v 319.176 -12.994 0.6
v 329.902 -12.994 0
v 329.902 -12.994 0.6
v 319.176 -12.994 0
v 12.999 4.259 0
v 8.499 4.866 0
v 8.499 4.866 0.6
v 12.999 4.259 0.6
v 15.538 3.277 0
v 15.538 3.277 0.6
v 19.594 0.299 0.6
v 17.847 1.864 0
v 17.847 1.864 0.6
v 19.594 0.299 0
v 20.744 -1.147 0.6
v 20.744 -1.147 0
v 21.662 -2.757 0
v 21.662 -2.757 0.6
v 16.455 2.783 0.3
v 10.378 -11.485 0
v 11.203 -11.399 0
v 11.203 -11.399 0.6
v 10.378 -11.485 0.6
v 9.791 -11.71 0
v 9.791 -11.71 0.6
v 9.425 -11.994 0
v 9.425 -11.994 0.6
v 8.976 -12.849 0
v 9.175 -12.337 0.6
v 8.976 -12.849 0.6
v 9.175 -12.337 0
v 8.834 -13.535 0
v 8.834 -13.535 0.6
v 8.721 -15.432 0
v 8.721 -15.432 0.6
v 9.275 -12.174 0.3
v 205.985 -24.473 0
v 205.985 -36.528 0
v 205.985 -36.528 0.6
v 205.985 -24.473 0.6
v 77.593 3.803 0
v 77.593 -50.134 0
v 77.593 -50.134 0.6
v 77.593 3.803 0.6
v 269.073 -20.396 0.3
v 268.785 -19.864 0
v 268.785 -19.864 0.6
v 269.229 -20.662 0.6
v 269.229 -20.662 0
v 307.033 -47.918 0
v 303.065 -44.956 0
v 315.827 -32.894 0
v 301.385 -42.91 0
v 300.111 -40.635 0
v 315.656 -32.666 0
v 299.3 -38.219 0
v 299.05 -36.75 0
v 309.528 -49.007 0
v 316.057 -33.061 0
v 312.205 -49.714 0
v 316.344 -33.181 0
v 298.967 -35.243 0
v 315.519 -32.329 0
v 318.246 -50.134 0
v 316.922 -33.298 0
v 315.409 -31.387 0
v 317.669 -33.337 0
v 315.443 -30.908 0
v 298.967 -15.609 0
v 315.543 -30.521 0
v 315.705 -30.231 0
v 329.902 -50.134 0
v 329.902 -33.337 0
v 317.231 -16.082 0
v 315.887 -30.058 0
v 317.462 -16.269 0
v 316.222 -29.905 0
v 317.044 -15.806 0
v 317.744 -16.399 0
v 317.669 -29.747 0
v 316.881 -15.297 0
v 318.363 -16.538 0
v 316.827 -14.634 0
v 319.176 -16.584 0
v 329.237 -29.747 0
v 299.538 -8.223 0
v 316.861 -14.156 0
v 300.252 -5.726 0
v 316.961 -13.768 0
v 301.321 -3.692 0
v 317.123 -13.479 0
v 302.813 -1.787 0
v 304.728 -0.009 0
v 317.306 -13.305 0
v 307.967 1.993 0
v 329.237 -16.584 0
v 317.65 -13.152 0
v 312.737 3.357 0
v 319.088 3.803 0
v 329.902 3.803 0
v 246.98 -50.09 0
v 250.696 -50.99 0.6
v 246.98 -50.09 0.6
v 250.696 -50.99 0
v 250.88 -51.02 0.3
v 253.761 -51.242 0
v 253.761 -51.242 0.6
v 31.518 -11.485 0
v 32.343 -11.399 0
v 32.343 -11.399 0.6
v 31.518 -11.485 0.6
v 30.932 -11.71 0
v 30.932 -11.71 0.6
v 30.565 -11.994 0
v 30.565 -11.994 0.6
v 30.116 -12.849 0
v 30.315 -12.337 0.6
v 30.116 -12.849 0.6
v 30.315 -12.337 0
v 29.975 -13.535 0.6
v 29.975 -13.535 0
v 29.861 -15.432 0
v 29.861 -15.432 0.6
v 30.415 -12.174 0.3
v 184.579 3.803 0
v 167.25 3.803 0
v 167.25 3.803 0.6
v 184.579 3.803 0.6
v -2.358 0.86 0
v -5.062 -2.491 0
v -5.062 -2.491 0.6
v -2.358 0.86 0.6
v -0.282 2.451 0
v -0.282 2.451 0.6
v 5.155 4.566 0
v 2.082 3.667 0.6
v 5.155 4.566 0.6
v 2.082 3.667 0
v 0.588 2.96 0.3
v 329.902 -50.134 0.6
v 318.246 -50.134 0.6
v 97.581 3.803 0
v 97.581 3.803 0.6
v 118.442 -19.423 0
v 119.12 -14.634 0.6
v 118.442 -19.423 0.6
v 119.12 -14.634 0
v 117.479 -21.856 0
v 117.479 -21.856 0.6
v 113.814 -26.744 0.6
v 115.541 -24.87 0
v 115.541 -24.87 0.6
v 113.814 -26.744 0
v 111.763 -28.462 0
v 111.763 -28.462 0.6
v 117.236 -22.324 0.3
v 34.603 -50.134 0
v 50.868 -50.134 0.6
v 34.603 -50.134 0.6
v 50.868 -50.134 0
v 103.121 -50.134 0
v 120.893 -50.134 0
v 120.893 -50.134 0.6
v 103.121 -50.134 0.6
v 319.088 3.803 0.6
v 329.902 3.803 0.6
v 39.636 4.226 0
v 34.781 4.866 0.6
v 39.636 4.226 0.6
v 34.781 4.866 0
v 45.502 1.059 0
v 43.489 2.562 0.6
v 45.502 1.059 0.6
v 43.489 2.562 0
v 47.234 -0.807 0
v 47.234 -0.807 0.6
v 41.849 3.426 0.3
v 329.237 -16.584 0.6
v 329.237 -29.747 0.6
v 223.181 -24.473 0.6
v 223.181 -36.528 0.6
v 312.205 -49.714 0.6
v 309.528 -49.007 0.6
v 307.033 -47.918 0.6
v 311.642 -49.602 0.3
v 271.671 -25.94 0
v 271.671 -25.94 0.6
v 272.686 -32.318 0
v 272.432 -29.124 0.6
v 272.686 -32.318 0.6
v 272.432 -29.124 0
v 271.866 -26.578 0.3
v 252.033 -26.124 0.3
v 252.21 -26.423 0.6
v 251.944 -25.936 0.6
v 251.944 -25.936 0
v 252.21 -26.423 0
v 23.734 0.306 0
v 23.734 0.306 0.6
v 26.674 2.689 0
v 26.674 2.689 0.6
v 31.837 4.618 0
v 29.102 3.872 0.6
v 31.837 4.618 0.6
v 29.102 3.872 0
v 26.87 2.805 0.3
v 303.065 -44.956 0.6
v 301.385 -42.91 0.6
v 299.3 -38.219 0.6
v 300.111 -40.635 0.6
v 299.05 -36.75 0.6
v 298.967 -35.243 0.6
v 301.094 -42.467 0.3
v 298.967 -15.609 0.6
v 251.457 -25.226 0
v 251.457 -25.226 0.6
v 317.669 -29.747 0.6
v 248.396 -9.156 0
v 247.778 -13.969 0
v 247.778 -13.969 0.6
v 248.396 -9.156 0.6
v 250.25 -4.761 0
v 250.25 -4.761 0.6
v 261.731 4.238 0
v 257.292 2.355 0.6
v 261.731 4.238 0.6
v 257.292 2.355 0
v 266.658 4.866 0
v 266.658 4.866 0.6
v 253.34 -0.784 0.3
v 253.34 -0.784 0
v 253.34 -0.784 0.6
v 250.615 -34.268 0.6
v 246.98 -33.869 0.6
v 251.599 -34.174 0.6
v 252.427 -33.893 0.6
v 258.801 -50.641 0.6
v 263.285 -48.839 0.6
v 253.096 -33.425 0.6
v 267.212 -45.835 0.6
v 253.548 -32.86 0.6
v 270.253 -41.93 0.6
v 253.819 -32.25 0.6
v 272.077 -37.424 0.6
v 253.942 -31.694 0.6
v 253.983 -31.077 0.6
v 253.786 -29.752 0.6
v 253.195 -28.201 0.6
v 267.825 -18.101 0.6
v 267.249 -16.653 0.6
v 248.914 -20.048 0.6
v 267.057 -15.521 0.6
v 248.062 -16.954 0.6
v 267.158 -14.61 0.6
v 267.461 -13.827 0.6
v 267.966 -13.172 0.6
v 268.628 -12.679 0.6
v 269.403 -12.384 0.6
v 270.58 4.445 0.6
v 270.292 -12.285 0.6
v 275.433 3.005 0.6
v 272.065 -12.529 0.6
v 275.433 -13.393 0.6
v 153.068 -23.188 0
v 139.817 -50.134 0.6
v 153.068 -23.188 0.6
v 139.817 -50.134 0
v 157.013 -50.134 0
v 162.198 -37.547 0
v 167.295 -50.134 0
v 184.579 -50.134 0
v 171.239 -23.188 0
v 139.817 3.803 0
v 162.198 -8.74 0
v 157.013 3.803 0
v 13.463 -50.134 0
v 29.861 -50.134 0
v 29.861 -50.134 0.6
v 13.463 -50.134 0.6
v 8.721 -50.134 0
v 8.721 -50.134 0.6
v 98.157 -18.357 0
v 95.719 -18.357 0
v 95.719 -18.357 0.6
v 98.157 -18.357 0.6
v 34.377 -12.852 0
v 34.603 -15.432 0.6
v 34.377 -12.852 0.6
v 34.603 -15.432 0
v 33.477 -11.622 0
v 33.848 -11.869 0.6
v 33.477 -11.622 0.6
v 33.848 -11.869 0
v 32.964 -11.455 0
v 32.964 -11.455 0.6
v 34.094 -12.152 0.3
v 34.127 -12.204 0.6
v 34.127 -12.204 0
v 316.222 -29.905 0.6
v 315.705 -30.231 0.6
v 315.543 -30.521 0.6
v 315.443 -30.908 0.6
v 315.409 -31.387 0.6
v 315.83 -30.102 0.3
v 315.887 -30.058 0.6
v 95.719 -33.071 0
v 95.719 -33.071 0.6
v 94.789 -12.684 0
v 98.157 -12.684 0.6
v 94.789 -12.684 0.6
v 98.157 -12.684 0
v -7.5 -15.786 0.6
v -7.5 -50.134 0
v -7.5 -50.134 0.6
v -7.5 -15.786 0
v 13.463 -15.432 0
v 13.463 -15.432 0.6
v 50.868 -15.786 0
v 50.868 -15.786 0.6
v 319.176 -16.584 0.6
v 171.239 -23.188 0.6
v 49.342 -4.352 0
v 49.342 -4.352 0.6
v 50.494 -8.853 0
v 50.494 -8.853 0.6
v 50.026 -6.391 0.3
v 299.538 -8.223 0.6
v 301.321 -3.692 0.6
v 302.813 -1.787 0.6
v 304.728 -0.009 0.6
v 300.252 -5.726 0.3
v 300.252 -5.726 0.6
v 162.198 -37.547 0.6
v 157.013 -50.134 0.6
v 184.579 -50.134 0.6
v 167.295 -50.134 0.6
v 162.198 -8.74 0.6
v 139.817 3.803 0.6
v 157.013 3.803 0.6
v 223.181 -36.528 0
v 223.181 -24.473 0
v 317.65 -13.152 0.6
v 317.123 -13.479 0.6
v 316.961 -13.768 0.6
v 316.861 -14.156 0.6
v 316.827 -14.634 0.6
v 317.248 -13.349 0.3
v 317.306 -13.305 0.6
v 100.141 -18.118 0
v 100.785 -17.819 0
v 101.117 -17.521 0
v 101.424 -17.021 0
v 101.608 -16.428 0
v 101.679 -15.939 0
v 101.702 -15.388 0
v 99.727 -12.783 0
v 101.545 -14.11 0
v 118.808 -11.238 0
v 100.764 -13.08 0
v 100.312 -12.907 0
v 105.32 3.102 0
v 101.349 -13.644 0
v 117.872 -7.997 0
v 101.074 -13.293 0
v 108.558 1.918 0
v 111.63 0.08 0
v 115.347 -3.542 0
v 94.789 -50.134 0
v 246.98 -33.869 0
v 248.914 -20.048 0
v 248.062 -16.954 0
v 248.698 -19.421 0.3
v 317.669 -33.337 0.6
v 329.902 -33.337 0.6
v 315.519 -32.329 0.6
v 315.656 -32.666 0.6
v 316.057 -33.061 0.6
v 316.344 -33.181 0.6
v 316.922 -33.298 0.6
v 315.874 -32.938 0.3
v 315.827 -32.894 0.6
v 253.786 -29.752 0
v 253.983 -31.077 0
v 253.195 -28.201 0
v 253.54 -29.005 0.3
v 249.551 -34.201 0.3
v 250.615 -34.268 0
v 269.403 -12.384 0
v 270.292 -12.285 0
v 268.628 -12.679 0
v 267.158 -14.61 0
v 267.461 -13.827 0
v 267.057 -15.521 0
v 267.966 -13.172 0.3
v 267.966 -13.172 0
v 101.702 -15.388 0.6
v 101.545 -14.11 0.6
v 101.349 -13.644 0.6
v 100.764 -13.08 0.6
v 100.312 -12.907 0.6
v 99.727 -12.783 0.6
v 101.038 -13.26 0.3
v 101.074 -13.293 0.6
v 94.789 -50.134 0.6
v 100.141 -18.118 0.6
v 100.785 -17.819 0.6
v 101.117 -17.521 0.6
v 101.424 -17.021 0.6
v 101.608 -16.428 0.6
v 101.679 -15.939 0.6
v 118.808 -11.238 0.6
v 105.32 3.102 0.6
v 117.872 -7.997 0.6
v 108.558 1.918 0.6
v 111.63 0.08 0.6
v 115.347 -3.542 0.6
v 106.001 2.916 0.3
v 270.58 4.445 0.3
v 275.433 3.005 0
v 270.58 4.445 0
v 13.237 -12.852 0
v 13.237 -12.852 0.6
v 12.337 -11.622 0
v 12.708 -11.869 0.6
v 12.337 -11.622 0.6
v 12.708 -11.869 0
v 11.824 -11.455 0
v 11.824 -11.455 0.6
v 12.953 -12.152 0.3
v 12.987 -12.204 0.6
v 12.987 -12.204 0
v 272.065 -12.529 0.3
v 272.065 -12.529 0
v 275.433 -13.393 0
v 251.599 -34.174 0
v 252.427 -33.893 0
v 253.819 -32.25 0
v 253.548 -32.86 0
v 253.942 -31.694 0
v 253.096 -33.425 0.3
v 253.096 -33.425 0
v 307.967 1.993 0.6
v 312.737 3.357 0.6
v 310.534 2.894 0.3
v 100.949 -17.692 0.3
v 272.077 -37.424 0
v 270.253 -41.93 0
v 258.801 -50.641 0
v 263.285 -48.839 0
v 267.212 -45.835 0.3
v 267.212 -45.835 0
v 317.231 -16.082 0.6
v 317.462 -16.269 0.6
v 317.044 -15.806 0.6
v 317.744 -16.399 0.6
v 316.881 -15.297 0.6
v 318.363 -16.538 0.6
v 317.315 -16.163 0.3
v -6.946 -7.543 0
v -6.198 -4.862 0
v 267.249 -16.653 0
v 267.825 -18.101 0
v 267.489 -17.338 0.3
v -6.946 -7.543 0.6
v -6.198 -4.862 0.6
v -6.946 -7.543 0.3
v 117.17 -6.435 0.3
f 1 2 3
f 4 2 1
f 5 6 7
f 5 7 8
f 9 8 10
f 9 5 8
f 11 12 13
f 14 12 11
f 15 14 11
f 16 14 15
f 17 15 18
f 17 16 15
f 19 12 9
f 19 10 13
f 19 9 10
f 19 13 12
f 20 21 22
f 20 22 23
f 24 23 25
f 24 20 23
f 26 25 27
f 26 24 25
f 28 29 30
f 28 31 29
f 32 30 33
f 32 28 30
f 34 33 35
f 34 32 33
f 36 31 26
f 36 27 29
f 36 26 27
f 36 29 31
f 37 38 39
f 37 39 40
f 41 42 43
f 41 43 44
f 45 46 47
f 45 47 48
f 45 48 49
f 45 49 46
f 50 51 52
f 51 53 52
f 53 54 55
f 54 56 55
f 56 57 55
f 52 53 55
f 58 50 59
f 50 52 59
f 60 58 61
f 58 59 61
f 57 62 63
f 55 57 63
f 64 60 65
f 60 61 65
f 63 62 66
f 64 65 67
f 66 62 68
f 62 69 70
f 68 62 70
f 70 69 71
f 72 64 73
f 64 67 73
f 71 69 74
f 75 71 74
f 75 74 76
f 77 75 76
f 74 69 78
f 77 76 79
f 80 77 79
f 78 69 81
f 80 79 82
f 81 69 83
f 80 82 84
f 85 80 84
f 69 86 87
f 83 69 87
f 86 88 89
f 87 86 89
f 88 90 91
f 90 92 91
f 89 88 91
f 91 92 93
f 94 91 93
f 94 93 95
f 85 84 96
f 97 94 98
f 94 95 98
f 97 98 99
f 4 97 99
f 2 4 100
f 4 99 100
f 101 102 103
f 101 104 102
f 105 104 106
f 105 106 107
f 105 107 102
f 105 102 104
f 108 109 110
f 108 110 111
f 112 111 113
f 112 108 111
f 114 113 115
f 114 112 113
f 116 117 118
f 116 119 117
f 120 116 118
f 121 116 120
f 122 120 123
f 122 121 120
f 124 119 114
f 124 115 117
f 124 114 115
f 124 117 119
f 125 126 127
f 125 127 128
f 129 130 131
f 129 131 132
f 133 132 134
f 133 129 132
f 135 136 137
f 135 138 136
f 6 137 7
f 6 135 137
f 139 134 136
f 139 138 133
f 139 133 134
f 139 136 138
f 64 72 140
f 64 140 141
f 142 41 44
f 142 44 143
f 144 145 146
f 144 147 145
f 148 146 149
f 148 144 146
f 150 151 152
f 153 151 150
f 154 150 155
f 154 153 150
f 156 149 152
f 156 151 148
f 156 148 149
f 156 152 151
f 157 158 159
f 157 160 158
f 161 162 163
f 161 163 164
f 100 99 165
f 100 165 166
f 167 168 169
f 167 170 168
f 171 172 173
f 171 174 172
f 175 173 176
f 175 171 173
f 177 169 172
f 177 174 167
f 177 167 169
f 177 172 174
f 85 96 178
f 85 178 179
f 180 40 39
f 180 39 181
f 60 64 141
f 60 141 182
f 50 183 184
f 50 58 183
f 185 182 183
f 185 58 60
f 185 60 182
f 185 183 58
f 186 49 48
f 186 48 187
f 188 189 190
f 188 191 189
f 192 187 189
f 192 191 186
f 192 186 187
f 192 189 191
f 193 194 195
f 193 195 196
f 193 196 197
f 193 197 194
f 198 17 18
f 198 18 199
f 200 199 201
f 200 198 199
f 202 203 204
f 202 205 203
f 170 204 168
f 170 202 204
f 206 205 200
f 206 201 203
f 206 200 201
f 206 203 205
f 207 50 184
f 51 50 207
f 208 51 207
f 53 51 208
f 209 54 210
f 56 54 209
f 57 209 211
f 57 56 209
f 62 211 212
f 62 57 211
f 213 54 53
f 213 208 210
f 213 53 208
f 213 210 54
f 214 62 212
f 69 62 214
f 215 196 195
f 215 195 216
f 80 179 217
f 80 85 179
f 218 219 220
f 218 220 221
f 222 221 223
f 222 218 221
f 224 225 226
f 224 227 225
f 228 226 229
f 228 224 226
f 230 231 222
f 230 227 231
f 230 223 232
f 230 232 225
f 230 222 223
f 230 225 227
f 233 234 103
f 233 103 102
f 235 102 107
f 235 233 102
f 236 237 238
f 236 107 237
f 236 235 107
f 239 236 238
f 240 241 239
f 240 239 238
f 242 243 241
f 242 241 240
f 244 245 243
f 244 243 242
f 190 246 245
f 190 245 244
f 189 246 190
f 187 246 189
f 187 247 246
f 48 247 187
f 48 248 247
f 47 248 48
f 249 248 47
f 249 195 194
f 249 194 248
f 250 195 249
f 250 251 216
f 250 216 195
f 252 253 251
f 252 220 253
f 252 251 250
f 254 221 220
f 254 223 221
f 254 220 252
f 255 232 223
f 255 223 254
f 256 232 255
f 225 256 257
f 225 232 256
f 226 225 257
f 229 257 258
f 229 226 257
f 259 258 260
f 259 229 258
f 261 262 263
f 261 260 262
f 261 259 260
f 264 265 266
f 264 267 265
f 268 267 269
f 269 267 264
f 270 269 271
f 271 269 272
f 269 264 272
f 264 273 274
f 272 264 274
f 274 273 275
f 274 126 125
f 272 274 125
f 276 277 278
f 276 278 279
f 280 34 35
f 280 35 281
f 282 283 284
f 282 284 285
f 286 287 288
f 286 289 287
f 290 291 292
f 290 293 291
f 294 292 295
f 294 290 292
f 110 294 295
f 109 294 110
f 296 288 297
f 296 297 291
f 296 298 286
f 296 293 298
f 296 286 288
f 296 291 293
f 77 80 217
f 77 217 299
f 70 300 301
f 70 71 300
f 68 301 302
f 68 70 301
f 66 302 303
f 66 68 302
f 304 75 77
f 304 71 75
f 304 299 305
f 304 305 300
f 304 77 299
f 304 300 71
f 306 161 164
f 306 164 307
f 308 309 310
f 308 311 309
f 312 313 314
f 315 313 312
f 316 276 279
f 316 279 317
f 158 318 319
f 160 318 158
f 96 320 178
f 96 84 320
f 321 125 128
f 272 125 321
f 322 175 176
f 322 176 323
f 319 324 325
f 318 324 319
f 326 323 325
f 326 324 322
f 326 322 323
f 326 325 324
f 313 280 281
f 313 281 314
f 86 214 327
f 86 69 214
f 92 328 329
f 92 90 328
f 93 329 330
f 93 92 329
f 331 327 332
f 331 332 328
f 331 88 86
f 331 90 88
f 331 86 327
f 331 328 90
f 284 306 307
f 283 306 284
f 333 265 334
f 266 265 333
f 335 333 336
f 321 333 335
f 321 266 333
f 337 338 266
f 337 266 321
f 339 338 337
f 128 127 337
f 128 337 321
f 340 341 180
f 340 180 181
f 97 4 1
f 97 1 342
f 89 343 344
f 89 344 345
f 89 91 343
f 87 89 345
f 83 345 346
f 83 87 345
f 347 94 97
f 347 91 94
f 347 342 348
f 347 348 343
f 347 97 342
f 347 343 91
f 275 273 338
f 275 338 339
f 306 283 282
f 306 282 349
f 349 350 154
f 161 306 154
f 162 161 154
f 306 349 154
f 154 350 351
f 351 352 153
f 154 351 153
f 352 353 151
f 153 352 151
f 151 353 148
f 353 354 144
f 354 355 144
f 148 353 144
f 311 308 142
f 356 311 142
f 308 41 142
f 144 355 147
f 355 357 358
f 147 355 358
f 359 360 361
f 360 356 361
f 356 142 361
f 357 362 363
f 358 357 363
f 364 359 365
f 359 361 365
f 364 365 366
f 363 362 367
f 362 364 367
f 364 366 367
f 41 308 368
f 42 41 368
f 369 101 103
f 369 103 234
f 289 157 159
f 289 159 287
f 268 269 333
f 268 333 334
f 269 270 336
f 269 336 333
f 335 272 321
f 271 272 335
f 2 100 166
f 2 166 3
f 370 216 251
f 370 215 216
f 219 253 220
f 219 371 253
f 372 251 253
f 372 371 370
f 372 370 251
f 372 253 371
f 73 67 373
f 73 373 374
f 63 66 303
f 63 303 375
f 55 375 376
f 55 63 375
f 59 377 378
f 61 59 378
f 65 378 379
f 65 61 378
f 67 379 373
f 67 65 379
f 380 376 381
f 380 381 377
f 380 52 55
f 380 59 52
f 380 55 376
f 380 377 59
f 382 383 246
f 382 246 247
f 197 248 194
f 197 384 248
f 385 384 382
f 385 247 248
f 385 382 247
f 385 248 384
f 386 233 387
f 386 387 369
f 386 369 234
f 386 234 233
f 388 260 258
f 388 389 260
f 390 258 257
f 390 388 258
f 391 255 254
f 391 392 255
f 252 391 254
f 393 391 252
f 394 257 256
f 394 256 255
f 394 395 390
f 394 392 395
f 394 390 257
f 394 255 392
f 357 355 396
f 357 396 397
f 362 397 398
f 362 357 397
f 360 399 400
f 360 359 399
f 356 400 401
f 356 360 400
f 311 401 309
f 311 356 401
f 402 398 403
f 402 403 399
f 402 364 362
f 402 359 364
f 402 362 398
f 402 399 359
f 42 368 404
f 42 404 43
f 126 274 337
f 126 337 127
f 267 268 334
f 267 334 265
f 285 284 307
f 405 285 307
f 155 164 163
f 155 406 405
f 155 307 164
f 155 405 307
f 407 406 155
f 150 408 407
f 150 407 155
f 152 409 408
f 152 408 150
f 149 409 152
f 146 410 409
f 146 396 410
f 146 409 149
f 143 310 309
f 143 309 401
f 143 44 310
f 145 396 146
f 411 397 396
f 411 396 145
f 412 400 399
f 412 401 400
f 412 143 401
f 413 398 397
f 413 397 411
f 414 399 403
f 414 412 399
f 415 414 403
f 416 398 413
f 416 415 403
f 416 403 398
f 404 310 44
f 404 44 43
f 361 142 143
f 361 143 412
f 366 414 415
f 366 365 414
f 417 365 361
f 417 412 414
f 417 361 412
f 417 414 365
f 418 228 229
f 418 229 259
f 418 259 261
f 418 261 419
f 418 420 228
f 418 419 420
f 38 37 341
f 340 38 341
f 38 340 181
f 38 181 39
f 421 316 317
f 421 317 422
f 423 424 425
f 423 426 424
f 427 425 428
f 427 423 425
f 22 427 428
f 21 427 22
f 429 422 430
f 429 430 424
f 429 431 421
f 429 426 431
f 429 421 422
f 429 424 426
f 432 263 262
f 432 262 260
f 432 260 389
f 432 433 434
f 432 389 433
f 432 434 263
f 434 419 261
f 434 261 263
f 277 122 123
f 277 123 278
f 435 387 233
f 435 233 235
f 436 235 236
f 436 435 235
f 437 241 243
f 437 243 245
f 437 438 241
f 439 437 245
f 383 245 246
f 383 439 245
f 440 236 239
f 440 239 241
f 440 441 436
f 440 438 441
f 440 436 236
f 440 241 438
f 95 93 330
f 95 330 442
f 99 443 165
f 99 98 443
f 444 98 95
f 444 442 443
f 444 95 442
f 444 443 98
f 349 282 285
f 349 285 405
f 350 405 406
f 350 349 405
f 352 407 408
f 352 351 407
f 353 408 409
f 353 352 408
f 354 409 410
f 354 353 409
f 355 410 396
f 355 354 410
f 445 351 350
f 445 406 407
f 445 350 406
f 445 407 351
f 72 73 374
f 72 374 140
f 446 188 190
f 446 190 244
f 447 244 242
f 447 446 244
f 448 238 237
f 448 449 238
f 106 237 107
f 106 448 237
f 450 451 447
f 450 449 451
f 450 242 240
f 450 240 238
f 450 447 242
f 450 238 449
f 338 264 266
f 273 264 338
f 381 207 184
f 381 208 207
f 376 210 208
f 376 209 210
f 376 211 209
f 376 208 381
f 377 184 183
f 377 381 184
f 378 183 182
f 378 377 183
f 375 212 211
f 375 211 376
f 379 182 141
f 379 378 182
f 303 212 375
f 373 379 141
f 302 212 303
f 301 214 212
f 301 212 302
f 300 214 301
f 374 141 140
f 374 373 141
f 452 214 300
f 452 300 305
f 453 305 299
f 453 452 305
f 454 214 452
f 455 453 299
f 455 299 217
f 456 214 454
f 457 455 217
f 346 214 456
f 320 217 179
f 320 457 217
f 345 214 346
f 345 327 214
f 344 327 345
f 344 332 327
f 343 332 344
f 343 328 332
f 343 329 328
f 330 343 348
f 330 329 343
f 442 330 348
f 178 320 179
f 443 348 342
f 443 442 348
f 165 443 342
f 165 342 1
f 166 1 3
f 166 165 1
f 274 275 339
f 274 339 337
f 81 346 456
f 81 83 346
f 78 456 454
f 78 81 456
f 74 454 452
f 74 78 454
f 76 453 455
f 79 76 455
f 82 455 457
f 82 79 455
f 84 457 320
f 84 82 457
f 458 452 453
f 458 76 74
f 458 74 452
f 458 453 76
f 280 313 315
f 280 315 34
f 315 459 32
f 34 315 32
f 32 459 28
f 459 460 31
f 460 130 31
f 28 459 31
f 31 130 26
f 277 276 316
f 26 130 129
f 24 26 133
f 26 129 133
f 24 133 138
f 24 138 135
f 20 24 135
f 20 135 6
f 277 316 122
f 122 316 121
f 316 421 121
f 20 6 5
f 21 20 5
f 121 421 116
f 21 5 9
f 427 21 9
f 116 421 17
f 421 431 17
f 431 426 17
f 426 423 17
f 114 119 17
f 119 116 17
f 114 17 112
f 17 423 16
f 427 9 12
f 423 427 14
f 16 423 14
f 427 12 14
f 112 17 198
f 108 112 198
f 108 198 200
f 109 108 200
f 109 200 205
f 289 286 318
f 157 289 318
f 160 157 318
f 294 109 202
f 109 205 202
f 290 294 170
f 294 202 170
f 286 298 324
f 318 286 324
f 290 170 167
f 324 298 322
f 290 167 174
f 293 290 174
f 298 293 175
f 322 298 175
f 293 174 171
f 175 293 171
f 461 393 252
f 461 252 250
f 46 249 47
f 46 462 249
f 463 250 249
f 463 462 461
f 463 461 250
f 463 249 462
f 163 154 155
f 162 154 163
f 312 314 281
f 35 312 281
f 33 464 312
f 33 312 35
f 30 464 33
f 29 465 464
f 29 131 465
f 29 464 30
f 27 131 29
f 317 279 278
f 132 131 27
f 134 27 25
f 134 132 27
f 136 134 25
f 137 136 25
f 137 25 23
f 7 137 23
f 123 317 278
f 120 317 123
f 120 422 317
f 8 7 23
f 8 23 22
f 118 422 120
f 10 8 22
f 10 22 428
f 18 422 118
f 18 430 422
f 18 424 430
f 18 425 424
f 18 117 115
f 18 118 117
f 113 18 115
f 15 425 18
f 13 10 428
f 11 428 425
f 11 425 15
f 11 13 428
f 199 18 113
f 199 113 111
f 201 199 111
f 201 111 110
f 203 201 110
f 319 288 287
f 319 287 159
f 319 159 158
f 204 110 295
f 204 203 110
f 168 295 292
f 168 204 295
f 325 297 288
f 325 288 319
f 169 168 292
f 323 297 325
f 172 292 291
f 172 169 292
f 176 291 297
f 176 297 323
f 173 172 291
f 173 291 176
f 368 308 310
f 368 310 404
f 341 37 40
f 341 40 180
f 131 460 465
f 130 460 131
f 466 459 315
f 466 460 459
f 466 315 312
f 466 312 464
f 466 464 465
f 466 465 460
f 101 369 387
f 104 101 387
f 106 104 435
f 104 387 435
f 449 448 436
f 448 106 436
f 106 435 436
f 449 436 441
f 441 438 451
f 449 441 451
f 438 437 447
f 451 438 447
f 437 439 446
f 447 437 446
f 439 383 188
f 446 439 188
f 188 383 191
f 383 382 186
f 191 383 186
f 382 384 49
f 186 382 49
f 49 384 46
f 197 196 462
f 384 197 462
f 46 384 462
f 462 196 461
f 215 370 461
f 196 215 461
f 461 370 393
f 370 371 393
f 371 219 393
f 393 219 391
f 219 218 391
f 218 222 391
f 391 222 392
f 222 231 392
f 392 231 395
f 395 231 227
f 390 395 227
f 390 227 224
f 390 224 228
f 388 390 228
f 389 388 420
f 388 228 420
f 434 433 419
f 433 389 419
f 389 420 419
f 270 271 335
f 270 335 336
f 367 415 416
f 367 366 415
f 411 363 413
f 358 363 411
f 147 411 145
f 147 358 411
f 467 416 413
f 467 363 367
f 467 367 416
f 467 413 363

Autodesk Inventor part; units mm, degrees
ref_plane "YZ Plane" through (0, 0, 0) normal (1, 0, 0) x (0, 1, 0)
ref_plane "XZ Plane" through (0, 0, 0) normal (0, 1, 0) x (-1, 0, 0)
ref_plane "XY Plane" through (0, 0, 0) normal (0, 0, 1) x (1, 0, 0)
sketch "Boceto1" plane through (0, 0, 0) normal (0, 0, 1) x (1, 0, 0)
  line L0 (-10.159, 4.8662) -> (417.1829, 4.8662) construction
  line L1 (417.1829, 4.8662) -> (417.1829, -72.825) construction
  line L2 (417.1829, -72.825) -> (-10.159, -72.825) construction
  line L3 (-10.159, -72.825) -> (-10.159, 4.8662) construction
  line L4 (34.6033, -50.1338) -> (34.6033, -15.4319)
  spline S0 degree 2 poles (34.6033, -15.4319) (34.6033, -12.9057) (33.584, -11.3989) (32.343, -11.3989) knots 0 0 0 1 2 2 2
  spline S1 degree 2 poles (32.343, -11.3989) (30.9691, -11.3989) (29.8612, -12.95) (29.8612, -15.4319) knots 0 0 0 1 2 2 2
  line L5 (29.8612, -15.4319) -> (29.8612, -50.1338)
  line L6 (29.8612, -50.1338) -> (13.4631, -50.1338)
  line L7 (13.4631, -50.1338) -> (13.4631, -15.4319)
  spline S2 degree 2 poles (13.4631, -15.4319) (13.4631, -12.9057) (12.4438, -11.3989) (11.2028, -11.3989) knots 0 0 0 1 2 2 2
  spline S3 degree 2 poles (11.2028, -11.3989) (9.8289, -11.3989) (8.721, -12.95) (8.721, -15.4319) knots 0 0 0 1 2 2 2
  line L8 (8.721, -15.4319) -> (8.721, -50.1338)
  line L9 (8.721, -50.1338) -> (-7.4998, -50.1338)
  line L10 (-7.4998, -50.1338) -> (-7.4998, -15.7865)
  spline S4 degree 2 poles (-7.4998, -15.7865) (-7.4998, -10.3795) (-6.3919, -4.7067) (-5.0623, -2.4907) knots 0 0 0 1 2 2 2
  spline S5 degree 2 poles (-5.0623, -2.4907) (-2.935, 1.0548) (4.1118, 4.8662) (8.4994, 4.8662) knots 0 0 0 1 2 2 2
  spline S6 degree 2 poles (8.4994, 4.8662) (12.887, 4.8662) (20.0223, 0.7002) (21.6621, -2.7567) knots 0 0 0 1 2 2 2
  spline S7 degree 2 poles (21.6621, -2.7567) (23.3463, 0.7446) (30.393, 4.8662) (34.7806, 4.8662) knots 0 0 0 1 2 2 2
  spline S8 degree 2 poles (34.7806, 4.8662) (38.6363, 4.8662) (45.0626, 1.9855) (47.2343, -0.8066) knots 0 0 0 1 2 2 2
  spline S9 degree 2 poles (47.2343, -0.8066) (49.1843, -3.1998) (50.8684, -9.5818) (50.8684, -15.7865) knots 0 0 0 1 2 2 2
  line L11 (50.8684, -15.7865) -> (50.8684, -50.1338)
  line L12 (50.8684, -50.1338) -> (34.6033, -50.1338)
  line L13 (95.7193, -18.357) -> (98.1569, -18.357)
  spline S10 degree 2 poles (98.1569, -18.357) (100.1956, -18.357) (101.7024, -17.0274) (101.7024, -15.3876) knots 0 0 0 1 2 2 2
  spline S11 degree 2 poles (101.7024, -15.3876) (101.7024, -13.8364) (100.3729, -12.6841) (98.1569, -12.6841) knots 0 0 0 1 2 2 2
  line L14 (98.1569, -12.6841) -> (94.7886, -12.6841)
  line L15 (94.7886, -12.6841) -> (94.7886, -50.1338)
  line L16 (94.7886, -50.1338) -> (77.5928, -50.1338)
  line L17 (77.5928, -50.1338) -> (77.5928, 3.8026)
  line L18 (77.5928, 3.8026) -> (97.5807, 3.8026)
  spline S12 degree 2 poles (97.5807, 3.8026) (103.0763, 3.8026) (108.9264, 2.0298) (111.6299, 0.0798) knots 0 0 0 1 2 2 2
  spline S13 degree 2 poles (111.6299, 0.0798) (115.2197, -2.5794) (119.1198, -10.2909) (119.1198, -14.6342) knots 0 0 0 1 2 2 2
  spline S14 degree 2 poles (119.1198, -14.6342) (119.1198, -18.8445) (115.3527, -25.8026) (111.7629, -28.4617) knots 0 0 0 1 2 2 2
  line L19 (111.7629, -28.4617) -> (120.8926, -50.1338)
  line L20 (120.8926, -50.1338) -> (103.1206, -50.1338)
  line L21 (103.1206, -50.1338) -> (95.7193, -33.0709)
  line L22 (95.7193, -33.0709) -> (95.7193, -18.357)
  line L23 (139.8168, 3.8026) -> (157.0127, 3.8026)
  line L24 (157.0127, 3.8026) -> (162.198, -8.7397)
  line L25 (162.198, -8.7397) -> (167.2504, 3.8026)
  line L26 (167.2504, 3.8026) -> (184.5791, 3.8026)
  line L27 (184.5791, 3.8026) -> (171.2391, -23.1878)
  line L28 (171.2391, -23.1878) -> (184.5791, -50.1338)
  line L29 (184.5791, -50.1338) -> (167.2947, -50.1338)
  line L30 (167.2947, -50.1338) -> (162.198, -37.5471)
  line L31 (162.198, -37.5471) -> (157.0127, -50.1338)
  line L32 (157.0127, -50.1338) -> (139.8168, -50.1338)
  line L33 (139.8168, -50.1338) -> (153.0683, -23.1878)
  line L34 (153.0683, -23.1878) -> (139.8168, 3.8026)
  line L35 (205.9853, -36.5278) -> (205.9853, -24.473)
  line L36 (205.9853, -24.473) -> (223.1811, -24.473)
  line L37 (223.1811, -24.473) -> (223.1811, -36.5278)
  line L38 (223.1811, -36.5278) -> (205.9853, -36.5278)
  line L39 (246.9804, -50.0895) -> (246.9804, -33.8687)
  spline S15 degree 2 poles (246.9804, -33.8687) (248.9748, -34.1346) (250.1271, -34.2675) (250.6146, -34.2675) knots 0 0 0 1 2 2 2
  spline S16 degree 2 poles (250.6146, -34.2675) (252.2101, -34.2675) (253.9828, -32.5834) (253.9828, -31.0766) knots 0 0 0 1 2 2 2
  spline S17 degree 2 poles (253.9828, -31.0766) (253.9828, -29.2595) (252.2101, -26.4231) knots 0 0 0 1 1 1
  spline S18 degree 2 poles (252.2101, -26.4231) (251.9885, -26.0685) (251.9442, -25.9355) knots 0 0 0 1 1 1
  line L40 (251.9442, -25.9355) -> (251.4567, -25.2264)
  spline S19 degree 2 poles (251.4567, -25.2264) (247.7782, -19.2434) (247.7782, -13.9694) knots 0 0 0 1 1 1
  spline S20 degree 2 poles (247.7782, -13.9694) (247.7782, -6.4351) (258.9023, 4.8662) (266.6581, 4.8662) knots 0 0 0 1 2 2 2
  spline S21 degree 2 poles (266.6581, 4.8662) (268.5195, 4.8662) (272.6412, 4.0242) (275.4333, 3.0048) knots 0 0 0 1 2 2 2
  line L41 (275.4333, 3.0048) -> (275.4333, -13.3932)
  spline S22 degree 2 poles (275.4333, -13.3932) (273.0401, -12.7728) (271.09, -12.2853) (270.2923, -12.2853) knots 0 0 0 1 2 2 2
  spline S23 degree 2 poles (270.2923, -12.2853) (268.8741, -12.2853) (267.057, -14.058) (267.057, -15.5206) knots 0 0 0 1 2 2 2
  spline S24 degree 2 poles (267.057, -15.5206) (267.057, -16.9831) (268.7854, -19.8638) knots 0 0 0 1 1 1
  spline S25 degree 2 poles (268.7854, -19.8638) (269.14, -20.5286) (269.2286, -20.6616) knots 0 0 0 1 1 1
  spline S26 degree 2 poles (269.2286, -20.6616) (271.0457, -23.7196) (272.6855, -29.4368) (272.6855, -32.3175) knots 0 0 0 1 2 2 2
  spline S27 degree 2 poles (272.6855, -32.3175) (272.6855, -40.4279) (261.7387, -51.2417) (253.7612, -51.2417) knots 0 0 0 1 2 2 2
  spline S28 degree 2 poles (253.7612, -51.2417) (252.2987, -51.2417) (249.4623, -50.7986) (246.9804, -50.0895) knots 0 0 0 1 2 2 2
  line L42 (329.9015, -50.1338) -> (318.2455, -50.1338)
  spline S29 degree 2 poles (318.2455, -50.1338) (314.0795, -50.1338) (309.2044, -49.0701) (307.0328, -47.9178) knots 0 0 0 1 2 2 2
  spline S30 degree 2 poles (307.0328, -47.9178) (303.2214, -45.8348) (298.9667, -39.0983) (298.9667, -35.2426) knots 0 0 0 1 2 2 2
  line L43 (298.9667, -35.2426) -> (298.9667, -15.6092)
  spline S31 degree 2 poles (298.9667, -15.6092) (298.9667, -8.8727) (301.5372, -2.5794) (304.7282, -0.0089) knots 0 0 0 1 2 2 2
  spline S32 degree 2 poles (304.7282, -0.0089) (307.1214, 1.9855) (313.9466, 3.8026) (319.0876, 3.8026) knots 0 0 0 1 2 2 2
  line L44 (319.0876, 3.8026) -> (329.9015, 3.8026)
  line L45 (329.9015, 3.8026) -> (329.9015, -12.9944)
  line L46 (329.9015, -12.9944) -> (319.1762, -12.9944)
  spline S33 degree 2 poles (319.1762, -12.9944) (317.6694, -12.9944) (316.8273, -13.7035) (316.8273, -14.6342) knots 0 0 0 1 2 2 2
  spline S34 degree 2 poles (316.8273, -14.6342) (316.8273, -15.7422) (317.8023, -16.5842) (319.1762, -16.5842) knots 0 0 0 1 2 2 2
  line L47 (319.1762, -16.5842) -> (329.2367, -16.5842)
  line L48 (329.2367, -16.5842) -> (329.2367, -29.747)
  line L49 (329.2367, -29.747) -> (317.6694, -29.747)
  spline S35 degree 2 poles (317.6694, -29.747) (316.2512, -29.747) (315.4091, -30.4561) (315.4091, -31.3868) knots 0 0 0 1 2 2 2
  spline S36 degree 2 poles (315.4091, -31.3868) (315.4091, -32.5391) (316.3398, -33.3368) (317.6694, -33.3368) knots 0 0 0 1 2 2 2
  line L50 (317.6694, -33.3368) -> (329.9015, -33.3368)
  line L51 (329.9015, -33.3368) -> (329.9015, -50.1338)
  point P0 (0, 0)
extrude "Extrusión1" add sketch "Boceto1" along normal blind 0.6
properties part number "Logo"
